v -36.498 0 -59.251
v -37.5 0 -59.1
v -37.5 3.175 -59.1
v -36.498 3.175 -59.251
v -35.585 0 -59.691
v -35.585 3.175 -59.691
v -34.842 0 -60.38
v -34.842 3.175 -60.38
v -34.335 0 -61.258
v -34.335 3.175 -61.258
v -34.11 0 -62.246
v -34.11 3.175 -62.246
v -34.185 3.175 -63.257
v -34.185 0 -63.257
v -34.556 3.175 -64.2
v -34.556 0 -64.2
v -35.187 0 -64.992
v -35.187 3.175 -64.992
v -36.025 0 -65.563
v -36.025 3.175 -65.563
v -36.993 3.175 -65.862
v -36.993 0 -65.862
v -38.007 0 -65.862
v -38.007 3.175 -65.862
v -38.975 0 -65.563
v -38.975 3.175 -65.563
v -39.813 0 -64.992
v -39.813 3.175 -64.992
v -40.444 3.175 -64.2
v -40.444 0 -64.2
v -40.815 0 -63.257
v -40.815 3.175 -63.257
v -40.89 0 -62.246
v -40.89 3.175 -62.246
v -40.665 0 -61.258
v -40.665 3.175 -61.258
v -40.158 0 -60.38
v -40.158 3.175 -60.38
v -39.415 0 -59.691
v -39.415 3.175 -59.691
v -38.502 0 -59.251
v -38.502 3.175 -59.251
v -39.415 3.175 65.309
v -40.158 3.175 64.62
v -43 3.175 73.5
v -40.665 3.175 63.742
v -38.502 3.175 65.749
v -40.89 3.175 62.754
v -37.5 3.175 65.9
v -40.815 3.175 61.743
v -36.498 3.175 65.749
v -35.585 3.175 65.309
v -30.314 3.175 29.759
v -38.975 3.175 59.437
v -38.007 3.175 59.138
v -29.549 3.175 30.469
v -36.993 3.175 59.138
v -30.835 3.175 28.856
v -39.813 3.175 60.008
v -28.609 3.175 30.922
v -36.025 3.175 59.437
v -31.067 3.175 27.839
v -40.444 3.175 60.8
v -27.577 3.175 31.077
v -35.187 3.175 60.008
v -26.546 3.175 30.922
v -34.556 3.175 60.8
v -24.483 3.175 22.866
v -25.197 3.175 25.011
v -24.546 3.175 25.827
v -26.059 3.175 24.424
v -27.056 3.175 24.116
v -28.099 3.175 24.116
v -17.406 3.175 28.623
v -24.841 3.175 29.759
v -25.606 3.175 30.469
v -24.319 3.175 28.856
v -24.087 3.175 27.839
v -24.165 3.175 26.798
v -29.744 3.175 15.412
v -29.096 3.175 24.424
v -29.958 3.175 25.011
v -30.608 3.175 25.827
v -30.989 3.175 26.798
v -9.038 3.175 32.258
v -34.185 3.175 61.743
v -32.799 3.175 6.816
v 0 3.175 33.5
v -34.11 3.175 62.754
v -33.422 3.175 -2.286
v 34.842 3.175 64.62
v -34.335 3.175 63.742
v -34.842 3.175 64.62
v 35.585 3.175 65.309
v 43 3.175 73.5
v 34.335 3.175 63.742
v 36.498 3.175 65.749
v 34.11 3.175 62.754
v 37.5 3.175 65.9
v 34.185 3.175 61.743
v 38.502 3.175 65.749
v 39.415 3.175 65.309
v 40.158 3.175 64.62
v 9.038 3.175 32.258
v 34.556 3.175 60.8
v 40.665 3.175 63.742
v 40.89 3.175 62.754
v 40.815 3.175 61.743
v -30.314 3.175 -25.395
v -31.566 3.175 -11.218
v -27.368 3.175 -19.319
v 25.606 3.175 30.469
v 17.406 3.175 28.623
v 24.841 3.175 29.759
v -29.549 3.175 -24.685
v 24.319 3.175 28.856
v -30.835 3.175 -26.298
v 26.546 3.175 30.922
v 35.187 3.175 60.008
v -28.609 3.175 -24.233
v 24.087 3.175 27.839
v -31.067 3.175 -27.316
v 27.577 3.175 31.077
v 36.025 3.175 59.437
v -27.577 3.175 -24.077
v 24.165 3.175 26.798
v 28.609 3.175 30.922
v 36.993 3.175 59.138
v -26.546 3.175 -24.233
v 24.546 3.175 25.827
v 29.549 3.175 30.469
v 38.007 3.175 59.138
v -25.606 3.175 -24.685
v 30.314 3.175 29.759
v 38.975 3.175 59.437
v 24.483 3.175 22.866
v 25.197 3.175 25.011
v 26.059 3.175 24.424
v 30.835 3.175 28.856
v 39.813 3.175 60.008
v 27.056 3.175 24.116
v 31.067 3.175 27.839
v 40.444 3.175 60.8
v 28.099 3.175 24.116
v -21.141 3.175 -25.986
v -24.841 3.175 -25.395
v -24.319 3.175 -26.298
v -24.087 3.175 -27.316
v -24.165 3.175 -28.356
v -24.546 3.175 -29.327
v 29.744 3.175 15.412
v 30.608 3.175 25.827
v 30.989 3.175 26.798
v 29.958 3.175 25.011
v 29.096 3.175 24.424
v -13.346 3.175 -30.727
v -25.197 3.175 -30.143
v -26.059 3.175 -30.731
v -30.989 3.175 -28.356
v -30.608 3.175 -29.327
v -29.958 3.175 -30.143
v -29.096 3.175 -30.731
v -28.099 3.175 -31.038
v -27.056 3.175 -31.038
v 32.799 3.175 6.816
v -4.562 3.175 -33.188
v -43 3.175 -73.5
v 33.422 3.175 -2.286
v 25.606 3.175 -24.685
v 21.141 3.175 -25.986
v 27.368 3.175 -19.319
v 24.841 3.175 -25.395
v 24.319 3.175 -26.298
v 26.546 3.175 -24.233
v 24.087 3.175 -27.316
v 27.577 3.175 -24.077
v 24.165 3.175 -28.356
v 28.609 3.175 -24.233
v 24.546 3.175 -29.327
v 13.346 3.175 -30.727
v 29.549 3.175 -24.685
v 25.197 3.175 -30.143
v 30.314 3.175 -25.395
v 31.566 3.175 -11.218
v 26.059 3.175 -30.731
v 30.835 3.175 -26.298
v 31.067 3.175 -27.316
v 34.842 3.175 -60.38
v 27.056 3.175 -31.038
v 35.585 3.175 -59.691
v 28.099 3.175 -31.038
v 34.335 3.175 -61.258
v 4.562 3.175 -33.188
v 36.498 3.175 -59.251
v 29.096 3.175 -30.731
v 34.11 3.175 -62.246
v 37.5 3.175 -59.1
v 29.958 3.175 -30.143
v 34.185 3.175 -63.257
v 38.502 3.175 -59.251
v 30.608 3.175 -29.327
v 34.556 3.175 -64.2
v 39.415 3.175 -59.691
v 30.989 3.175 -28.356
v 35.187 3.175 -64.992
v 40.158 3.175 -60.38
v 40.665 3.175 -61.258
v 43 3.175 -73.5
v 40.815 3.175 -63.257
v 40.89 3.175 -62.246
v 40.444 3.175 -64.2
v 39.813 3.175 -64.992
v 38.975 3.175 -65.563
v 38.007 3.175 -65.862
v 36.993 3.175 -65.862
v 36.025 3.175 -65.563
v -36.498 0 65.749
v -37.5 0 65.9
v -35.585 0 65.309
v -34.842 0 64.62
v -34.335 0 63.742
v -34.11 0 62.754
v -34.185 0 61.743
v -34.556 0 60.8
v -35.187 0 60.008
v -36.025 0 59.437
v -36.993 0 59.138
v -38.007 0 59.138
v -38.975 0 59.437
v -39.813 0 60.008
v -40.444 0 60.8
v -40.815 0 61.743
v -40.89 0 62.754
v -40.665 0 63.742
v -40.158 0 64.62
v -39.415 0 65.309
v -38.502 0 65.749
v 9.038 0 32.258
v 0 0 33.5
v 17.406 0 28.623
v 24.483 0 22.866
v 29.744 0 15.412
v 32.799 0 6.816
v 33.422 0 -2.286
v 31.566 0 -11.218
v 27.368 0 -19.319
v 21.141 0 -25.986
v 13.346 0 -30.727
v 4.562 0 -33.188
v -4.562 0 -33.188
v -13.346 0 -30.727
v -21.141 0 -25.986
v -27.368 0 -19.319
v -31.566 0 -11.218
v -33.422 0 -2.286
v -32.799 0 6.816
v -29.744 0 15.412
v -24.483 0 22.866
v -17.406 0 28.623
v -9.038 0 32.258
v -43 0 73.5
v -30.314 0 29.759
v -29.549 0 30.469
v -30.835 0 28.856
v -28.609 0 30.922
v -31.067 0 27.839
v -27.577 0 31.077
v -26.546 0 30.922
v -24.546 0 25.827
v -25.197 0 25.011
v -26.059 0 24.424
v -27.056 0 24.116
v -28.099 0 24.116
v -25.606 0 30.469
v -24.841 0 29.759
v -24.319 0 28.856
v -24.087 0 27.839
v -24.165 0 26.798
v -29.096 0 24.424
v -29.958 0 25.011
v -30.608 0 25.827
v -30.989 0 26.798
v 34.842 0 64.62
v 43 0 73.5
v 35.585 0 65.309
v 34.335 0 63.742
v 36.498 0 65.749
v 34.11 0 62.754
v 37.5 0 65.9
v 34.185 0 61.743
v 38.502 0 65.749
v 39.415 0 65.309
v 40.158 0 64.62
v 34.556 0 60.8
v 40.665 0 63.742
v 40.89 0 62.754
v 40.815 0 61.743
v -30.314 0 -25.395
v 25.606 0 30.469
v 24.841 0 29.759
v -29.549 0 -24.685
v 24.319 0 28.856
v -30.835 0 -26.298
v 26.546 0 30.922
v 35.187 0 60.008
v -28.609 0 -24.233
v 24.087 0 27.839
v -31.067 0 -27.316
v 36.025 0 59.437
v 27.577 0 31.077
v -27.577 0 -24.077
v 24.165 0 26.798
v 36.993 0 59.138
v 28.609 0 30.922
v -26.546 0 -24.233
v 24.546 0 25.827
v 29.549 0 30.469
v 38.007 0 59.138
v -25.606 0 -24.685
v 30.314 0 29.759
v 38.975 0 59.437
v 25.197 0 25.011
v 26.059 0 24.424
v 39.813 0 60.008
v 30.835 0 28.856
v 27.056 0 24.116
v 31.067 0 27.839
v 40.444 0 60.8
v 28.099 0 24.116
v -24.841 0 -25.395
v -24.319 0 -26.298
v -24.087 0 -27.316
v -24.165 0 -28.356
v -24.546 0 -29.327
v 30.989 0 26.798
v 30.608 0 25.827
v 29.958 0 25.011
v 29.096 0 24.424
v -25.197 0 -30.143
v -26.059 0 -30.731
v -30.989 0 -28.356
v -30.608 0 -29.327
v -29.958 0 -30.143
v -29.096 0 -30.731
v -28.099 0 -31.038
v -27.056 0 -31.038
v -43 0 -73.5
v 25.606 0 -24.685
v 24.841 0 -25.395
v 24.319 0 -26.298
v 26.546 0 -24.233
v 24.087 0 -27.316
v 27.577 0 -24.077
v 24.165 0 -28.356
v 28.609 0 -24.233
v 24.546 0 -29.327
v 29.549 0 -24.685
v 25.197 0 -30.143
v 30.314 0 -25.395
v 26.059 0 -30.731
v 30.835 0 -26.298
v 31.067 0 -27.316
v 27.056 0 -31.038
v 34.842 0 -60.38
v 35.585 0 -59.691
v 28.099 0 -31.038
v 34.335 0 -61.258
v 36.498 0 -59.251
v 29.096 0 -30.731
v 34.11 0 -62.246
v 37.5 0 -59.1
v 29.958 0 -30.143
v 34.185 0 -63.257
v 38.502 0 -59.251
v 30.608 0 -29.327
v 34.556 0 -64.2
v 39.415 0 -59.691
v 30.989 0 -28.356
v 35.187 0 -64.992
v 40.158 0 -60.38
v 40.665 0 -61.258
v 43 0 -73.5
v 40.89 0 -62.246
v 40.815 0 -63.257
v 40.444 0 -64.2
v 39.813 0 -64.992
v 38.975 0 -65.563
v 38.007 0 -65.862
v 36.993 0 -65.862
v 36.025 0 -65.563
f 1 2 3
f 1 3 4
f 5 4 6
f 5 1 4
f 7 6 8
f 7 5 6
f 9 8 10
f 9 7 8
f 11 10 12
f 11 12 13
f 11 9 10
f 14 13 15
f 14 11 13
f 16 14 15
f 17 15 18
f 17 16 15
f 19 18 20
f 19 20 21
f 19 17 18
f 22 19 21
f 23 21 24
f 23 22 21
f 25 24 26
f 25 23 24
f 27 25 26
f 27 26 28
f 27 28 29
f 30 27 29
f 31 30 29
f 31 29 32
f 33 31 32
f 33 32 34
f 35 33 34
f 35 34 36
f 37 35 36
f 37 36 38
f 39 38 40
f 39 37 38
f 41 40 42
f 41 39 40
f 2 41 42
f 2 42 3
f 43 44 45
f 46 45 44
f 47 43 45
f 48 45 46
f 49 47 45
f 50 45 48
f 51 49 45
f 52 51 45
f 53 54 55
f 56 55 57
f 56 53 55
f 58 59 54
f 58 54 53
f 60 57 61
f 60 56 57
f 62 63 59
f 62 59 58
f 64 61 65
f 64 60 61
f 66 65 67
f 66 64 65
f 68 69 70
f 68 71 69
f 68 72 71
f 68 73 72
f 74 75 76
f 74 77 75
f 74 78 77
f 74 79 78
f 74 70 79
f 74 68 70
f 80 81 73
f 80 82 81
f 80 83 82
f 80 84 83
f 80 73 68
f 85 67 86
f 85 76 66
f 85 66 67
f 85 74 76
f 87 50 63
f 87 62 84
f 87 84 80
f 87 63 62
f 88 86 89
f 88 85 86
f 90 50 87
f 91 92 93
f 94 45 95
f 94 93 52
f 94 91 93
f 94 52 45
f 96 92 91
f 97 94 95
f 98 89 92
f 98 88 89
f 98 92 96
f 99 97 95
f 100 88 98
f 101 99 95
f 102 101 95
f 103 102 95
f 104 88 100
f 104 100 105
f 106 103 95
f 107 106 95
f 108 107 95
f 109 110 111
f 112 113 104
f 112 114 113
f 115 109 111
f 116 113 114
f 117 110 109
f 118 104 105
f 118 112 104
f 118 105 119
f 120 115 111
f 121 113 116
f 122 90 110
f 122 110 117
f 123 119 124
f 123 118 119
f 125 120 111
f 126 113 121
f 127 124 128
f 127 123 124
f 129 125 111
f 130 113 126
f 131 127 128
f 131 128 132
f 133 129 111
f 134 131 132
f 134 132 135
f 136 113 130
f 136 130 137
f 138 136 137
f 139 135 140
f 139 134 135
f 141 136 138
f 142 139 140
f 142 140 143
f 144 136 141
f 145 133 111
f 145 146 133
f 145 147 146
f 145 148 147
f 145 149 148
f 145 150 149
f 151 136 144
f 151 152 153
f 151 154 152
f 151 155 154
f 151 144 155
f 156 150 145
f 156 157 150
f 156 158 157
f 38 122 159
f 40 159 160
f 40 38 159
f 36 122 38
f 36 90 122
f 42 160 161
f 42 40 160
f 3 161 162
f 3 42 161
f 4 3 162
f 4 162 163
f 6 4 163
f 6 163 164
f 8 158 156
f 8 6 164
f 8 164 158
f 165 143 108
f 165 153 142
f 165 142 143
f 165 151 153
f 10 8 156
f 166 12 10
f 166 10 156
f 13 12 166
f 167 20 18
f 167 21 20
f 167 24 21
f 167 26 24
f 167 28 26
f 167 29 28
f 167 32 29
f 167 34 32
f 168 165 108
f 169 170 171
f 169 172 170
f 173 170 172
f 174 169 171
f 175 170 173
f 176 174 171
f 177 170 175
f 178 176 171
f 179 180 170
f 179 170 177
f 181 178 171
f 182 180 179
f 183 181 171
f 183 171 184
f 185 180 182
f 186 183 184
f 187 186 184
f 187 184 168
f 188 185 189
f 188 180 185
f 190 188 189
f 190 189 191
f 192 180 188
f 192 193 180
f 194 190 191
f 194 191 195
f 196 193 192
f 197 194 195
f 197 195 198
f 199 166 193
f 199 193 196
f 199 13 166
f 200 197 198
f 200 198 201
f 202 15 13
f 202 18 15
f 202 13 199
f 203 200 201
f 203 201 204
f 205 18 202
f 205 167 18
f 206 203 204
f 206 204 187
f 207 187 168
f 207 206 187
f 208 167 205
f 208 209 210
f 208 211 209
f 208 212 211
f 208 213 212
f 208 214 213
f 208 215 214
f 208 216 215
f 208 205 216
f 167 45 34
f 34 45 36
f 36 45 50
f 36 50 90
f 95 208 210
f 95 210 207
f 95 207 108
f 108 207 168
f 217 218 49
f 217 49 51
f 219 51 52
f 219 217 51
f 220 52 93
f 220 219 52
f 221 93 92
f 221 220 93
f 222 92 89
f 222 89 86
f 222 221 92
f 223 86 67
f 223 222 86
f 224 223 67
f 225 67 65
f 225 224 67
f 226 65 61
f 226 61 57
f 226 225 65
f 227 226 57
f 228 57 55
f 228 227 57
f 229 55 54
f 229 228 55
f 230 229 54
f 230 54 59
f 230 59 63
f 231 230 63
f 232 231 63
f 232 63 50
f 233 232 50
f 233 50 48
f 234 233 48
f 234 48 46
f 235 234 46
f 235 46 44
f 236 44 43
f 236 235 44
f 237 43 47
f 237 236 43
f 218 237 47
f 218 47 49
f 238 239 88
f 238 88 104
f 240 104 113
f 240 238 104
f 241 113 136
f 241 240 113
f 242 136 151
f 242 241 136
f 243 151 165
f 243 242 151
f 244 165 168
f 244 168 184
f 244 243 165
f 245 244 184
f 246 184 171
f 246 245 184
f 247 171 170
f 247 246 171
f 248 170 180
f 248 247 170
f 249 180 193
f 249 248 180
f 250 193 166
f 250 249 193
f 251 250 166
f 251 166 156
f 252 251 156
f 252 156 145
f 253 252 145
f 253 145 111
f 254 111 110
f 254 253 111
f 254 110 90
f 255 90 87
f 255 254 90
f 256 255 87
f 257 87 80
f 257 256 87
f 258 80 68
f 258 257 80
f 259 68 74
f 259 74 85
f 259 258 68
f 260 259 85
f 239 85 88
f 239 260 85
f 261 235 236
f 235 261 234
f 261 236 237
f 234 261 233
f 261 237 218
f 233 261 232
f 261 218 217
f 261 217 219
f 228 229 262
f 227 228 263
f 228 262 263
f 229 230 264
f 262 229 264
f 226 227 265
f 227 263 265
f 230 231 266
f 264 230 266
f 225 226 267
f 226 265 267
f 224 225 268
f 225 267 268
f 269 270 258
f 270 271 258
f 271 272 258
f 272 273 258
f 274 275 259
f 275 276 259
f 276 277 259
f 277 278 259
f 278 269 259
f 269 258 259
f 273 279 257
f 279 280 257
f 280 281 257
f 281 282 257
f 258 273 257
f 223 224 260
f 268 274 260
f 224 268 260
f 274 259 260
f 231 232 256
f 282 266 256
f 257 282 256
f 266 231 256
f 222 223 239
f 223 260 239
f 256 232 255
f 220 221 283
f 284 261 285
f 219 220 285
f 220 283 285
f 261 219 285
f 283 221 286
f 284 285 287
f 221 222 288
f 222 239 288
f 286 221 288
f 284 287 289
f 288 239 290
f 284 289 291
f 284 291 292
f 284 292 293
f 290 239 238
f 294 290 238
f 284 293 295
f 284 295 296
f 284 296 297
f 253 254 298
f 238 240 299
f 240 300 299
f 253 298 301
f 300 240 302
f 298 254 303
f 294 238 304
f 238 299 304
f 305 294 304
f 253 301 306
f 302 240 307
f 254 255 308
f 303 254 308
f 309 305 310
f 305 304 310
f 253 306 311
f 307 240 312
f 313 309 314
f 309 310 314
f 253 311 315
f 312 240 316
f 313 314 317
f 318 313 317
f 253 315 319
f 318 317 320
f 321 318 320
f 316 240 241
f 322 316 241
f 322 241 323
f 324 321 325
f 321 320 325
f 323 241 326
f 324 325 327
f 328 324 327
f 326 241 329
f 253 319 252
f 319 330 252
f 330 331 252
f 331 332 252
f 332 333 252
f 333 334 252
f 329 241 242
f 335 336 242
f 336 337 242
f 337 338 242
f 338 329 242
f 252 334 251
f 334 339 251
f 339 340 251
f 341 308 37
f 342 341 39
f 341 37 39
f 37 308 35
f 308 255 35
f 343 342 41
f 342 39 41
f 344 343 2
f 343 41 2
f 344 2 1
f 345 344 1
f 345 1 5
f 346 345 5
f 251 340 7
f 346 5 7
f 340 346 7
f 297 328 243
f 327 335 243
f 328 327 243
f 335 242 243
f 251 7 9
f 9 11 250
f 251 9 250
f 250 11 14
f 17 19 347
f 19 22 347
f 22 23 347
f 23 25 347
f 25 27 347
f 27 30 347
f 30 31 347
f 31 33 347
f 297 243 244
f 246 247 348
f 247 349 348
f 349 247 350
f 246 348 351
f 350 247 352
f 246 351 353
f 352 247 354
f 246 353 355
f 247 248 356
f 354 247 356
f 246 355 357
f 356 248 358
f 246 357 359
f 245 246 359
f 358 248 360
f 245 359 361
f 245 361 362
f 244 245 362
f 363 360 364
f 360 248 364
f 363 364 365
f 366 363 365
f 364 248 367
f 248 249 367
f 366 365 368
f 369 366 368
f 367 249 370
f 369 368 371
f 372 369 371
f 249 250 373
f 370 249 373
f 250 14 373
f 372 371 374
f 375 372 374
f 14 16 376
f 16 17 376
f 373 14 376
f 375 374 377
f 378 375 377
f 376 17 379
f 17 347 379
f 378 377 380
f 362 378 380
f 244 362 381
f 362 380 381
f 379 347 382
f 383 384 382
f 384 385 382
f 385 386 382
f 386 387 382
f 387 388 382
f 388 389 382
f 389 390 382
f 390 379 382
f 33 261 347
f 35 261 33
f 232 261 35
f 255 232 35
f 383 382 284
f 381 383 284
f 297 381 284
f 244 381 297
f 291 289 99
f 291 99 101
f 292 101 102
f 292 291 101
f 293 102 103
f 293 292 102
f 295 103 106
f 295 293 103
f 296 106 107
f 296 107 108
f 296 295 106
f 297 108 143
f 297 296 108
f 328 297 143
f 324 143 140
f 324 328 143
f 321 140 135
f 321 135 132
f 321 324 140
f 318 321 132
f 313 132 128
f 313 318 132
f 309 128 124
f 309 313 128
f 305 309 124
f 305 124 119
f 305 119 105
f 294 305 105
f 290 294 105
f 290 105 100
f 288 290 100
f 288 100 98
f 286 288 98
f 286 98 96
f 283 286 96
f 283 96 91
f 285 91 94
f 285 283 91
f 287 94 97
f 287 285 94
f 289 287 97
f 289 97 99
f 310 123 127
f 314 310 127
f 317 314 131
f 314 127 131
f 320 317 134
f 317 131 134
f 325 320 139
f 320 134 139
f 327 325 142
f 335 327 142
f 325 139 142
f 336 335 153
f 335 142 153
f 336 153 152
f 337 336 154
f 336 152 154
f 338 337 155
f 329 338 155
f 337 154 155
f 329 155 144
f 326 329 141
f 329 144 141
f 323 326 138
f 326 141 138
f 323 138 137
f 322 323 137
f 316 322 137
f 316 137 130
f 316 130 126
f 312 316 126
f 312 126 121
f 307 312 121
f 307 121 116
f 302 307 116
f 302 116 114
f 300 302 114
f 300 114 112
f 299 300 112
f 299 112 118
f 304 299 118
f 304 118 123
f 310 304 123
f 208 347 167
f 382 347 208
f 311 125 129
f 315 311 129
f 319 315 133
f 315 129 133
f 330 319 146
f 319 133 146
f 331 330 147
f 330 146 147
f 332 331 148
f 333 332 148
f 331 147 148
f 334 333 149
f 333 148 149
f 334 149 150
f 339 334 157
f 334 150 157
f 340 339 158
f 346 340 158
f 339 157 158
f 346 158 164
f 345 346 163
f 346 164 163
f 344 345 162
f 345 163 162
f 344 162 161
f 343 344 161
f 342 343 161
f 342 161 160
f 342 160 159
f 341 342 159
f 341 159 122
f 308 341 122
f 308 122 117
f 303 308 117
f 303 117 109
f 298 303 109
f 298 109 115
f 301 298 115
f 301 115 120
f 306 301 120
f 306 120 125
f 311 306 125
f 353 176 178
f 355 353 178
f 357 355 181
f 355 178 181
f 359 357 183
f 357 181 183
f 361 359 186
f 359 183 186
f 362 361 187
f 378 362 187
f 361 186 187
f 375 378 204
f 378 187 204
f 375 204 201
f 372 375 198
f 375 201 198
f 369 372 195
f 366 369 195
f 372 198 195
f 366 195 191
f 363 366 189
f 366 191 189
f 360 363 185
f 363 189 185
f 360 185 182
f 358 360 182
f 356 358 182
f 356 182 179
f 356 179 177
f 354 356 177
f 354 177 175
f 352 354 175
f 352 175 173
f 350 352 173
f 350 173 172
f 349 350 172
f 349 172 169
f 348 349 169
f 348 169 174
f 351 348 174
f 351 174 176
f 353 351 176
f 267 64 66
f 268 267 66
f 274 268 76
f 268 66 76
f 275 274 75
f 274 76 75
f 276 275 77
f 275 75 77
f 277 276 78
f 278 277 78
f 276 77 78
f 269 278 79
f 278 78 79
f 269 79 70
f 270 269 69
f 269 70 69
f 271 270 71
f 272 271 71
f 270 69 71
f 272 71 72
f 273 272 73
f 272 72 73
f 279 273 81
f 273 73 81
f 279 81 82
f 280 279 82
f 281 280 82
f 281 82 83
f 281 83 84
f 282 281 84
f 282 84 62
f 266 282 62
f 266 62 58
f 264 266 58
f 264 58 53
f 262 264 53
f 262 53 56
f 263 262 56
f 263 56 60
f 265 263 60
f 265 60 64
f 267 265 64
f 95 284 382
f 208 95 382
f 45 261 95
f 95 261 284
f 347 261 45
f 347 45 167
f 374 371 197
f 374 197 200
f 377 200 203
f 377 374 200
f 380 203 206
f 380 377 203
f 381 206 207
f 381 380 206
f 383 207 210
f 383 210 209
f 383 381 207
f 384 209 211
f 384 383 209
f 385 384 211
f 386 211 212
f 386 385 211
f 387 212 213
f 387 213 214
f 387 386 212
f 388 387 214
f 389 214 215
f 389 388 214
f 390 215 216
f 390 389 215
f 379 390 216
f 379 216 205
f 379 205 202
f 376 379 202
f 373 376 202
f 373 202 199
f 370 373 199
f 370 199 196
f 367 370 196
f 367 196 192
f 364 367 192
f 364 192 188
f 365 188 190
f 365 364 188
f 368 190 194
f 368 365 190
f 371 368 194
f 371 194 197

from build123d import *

# Parameters (mm, degrees)
SKETCH1_W           = 86
SKETCH1_H           = 147
SKETCH1_R           = 33.5
SKETCH1_R_2         = 3.4
BOSS_EXTRUDE1_DEPTH = 3.175
SKETCH2_R           = 3.5
CUT_EXTRUDE1_DEPTH  = 10


with BuildPart() as part:
    # Sketch1 → Boss-Extrude1 (new body)
    with BuildSketch(Plane(origin=(0, 0, 0), x_dir=(1, 0, 0), z_dir=(0, 1, 0))):
        Rectangle(SKETCH1_W, SKETCH1_H)
        with Locations(Location((0, 0, 0), (0, 0, 270))):
            Circle(SKETCH1_R, mode=Mode.SUBTRACT)
        with Locations(Location((-37.5, -62.5, 0), (0, 0, 270))):
            Circle(SKETCH1_R_2, mode=Mode.SUBTRACT)
        with Locations(Location((37.5, -62.5, 0), (0, 0, 270))):
            Circle(SKETCH1_R_2, mode=Mode.SUBTRACT)
        with Locations(Location((-37.5, 62.5, 0), (0, 0, 270))):
            Circle(SKETCH1_R_2, mode=Mode.SUBTRACT)
        with Locations(Location((37.5, 62.5, 0), (0, 0, 270))):
            Circle(SKETCH1_R_2, mode=Mode.SUBTRACT)
    extrude(amount=BOSS_EXTRUDE1_DEPTH)

    # Sketch2 → Cut-Extrude1 (cut)
    with BuildSketch(Plane(origin=(0, 3.175, 0), x_dir=(1, 0, 0), z_dir=(0, 1, 0))):
        with Locations(Location((-27.577164466, 27.577164466, 0), (0, 0, 270))):
            Circle(SKETCH2_R)
        with Locations(Location((27.577164466, 27.577164466, 0), (0, 0, 270))):
            Circle(SKETCH2_R)
        with Locations(Location((27.577164466, -27.577164466, 0), (0, 0, 270))):
            Circle(SKETCH2_R)
        with Locations(Location((-27.577164466, -27.577164466, 0), (0, 0, 270))):
            Circle(SKETCH2_R)
    extrude(amount=-CUT_EXTRUDE1_DEPTH, mode=Mode.SUBTRACT)


solid = part.part
